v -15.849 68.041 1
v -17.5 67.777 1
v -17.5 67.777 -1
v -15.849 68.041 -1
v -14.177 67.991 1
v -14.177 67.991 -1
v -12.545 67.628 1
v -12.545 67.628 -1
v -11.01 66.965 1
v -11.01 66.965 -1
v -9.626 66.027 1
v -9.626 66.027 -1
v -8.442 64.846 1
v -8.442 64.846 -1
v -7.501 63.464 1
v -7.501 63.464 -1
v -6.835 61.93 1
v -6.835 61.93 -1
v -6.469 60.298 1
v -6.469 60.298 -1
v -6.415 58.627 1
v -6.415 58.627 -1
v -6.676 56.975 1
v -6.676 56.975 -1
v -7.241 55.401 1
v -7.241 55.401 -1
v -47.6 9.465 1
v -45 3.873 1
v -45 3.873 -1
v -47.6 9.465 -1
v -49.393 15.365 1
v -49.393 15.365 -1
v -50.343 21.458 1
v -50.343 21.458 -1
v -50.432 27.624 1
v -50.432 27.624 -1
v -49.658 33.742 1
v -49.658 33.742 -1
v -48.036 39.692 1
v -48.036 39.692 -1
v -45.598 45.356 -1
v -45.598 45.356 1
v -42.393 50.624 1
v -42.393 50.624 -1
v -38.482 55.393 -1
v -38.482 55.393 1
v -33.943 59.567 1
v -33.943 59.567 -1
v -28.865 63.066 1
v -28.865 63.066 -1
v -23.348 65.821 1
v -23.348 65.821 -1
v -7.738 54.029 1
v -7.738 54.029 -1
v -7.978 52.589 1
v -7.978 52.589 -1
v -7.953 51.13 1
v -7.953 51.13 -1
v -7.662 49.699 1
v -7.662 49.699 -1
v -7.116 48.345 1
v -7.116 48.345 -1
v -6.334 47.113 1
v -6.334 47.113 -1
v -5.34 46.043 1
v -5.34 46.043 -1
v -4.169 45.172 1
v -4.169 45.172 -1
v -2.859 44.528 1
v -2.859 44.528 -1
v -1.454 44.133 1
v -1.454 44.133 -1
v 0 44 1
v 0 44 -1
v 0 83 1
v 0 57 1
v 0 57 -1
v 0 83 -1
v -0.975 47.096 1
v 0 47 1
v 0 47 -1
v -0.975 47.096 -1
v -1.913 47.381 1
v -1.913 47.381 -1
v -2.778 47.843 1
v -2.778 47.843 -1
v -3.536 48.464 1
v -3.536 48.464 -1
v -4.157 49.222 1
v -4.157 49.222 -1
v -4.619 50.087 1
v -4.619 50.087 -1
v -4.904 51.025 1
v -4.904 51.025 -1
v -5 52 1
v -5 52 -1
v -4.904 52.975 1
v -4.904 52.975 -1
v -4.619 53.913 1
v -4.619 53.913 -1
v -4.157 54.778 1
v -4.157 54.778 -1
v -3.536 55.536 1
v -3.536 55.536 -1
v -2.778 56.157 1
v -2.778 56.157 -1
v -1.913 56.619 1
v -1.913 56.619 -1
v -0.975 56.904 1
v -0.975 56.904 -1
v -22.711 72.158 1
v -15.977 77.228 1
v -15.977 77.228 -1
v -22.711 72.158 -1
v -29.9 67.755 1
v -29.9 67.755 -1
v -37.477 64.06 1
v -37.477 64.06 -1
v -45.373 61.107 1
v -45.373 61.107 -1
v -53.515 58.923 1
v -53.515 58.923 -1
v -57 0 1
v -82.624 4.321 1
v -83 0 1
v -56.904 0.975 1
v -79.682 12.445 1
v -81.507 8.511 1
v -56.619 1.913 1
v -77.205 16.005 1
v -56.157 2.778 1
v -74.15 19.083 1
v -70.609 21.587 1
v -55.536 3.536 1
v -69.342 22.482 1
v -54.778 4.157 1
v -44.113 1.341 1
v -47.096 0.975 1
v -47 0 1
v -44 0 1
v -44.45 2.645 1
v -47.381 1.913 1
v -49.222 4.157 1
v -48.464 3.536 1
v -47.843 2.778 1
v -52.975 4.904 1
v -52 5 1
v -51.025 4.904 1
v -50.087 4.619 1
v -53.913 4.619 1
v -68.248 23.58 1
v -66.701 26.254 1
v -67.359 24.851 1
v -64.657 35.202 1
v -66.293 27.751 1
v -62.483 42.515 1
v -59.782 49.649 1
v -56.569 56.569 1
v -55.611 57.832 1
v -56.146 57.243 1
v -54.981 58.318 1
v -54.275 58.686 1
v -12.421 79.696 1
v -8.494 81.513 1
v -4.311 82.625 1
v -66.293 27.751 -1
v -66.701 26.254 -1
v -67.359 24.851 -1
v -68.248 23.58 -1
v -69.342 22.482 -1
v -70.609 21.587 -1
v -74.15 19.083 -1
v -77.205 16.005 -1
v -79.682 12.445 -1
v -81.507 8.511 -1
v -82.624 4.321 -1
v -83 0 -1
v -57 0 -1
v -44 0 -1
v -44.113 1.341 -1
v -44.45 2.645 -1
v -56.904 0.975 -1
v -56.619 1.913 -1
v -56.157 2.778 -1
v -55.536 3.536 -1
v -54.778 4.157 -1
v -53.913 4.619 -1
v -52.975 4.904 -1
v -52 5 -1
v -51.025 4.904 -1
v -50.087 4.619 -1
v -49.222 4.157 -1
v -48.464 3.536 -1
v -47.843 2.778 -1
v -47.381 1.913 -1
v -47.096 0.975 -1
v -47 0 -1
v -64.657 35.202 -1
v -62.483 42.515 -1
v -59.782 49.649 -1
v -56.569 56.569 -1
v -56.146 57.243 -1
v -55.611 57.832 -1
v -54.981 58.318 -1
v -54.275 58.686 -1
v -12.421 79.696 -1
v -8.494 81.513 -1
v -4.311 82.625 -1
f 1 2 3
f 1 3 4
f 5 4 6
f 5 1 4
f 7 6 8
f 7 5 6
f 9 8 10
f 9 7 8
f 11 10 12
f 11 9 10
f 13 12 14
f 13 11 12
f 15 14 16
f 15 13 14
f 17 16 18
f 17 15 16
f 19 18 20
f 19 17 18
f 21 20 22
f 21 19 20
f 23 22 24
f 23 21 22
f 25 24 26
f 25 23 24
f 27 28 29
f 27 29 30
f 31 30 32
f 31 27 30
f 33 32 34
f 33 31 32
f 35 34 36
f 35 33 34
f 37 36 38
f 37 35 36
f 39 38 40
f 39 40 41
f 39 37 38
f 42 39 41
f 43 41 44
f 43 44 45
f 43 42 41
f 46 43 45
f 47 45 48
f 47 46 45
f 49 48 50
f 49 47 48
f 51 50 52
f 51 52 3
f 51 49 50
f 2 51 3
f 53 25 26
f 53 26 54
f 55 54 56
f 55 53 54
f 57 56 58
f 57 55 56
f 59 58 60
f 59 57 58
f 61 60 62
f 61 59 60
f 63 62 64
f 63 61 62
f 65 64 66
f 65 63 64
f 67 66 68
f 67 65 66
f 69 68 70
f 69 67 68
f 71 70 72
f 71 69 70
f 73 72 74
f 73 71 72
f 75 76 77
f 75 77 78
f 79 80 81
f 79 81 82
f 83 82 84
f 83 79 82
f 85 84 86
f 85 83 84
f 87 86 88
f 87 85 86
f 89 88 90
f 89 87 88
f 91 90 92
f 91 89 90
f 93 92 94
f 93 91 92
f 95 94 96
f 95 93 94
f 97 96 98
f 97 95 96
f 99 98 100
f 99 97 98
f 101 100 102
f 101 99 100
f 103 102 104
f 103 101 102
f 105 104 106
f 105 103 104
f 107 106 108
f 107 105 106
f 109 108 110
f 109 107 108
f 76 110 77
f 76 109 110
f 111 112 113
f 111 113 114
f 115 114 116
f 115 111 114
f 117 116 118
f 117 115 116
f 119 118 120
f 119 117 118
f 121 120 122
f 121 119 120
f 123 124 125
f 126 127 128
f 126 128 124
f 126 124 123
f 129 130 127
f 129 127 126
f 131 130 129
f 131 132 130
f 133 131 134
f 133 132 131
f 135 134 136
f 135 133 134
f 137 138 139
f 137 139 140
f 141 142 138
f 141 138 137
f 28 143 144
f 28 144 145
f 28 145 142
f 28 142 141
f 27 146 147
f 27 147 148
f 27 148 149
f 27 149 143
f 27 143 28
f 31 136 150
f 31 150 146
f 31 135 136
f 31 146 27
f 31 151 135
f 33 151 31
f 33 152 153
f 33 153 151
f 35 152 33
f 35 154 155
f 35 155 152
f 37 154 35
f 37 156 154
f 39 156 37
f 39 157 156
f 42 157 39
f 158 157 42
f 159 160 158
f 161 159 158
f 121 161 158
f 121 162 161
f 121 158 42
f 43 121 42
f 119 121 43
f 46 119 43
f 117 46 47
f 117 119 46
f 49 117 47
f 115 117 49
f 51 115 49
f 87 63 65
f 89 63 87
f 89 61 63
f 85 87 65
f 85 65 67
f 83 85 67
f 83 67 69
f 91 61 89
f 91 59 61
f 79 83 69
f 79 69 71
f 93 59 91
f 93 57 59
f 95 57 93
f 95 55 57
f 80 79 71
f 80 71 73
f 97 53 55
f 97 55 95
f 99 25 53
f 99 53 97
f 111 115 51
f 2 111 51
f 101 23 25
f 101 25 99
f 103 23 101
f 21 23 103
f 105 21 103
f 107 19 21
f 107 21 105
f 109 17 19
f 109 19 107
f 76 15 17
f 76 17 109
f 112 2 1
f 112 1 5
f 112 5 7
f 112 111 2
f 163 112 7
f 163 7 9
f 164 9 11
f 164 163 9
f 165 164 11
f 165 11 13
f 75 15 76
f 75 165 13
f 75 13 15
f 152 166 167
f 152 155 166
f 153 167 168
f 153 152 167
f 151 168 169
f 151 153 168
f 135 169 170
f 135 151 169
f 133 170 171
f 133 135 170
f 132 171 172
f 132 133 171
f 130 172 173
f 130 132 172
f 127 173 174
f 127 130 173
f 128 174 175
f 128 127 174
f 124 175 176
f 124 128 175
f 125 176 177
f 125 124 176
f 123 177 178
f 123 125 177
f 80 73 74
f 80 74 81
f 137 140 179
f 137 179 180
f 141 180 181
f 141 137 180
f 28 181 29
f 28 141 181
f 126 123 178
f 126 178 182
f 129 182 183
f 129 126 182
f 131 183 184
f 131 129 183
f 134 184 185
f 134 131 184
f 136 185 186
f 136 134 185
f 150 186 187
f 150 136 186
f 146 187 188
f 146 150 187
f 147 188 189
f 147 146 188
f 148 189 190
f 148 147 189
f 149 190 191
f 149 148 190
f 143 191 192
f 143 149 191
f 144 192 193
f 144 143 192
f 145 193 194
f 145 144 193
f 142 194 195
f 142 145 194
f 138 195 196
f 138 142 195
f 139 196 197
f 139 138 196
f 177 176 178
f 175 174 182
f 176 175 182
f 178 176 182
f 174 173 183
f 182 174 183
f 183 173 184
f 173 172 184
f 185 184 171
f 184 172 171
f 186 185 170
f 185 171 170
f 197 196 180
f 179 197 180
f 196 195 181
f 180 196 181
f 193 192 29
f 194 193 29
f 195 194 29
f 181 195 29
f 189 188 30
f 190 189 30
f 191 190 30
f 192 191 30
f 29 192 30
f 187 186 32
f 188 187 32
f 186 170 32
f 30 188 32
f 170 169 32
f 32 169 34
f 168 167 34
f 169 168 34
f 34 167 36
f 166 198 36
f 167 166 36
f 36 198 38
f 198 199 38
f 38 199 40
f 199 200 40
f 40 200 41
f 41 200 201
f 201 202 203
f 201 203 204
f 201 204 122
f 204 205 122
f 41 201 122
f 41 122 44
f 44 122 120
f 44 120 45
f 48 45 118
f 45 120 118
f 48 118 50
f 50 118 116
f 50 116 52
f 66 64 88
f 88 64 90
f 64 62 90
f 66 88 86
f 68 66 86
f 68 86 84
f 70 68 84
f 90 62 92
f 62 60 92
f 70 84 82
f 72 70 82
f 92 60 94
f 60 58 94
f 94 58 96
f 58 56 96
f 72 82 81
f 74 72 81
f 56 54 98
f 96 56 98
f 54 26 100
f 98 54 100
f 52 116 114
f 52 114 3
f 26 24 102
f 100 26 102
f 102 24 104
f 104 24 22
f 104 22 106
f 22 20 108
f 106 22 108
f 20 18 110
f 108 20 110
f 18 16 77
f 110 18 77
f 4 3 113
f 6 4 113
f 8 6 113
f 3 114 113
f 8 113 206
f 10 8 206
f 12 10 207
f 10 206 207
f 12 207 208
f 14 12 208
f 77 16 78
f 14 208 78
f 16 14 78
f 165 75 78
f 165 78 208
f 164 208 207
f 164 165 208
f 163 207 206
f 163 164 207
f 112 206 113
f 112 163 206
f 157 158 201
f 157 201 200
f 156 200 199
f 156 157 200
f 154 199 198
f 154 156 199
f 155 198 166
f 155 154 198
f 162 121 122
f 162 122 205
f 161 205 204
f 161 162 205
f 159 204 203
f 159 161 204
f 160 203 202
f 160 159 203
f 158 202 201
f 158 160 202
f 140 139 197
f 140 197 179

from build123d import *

# Parameters (mm, degrees)
LINEAR_AUSTRAGEN1_DEPTH = 1


with BuildPart() as part:
    # Außenkontur → Linear austragen1 (new body, symmetric)
    with BuildSketch(Plane.XY):
        with BuildLine():
            Line((-83, 0), (-57, 0))
            ThreePointArc((-57, 0), (-52, 5), (-47, 0))
            Line((-47, 0), (-44, 0))
            ThreePointArc((-44, 0), (-44.254033308, 2), (-45, 3.872983346))
            ThreePointArc((-45, 3.872983346), (-46.916580756, 42.566918881), (-17.5, 67.777208559))
            ThreePointArc((-17.5, 67.777208559), (-8.441984355, 64.845892989), (-7.240867658, 55.401446097))
            ThreePointArc((-7.240867658, 55.401446097), (-6.75320549, 47.711152181), (0, 44))
            Line((0, 44), (0, 47))
            ThreePointArc((0, 47), (-5, 52), (0, 57))
            Line((0, 57), (0, 83))
            ThreePointArc((0, 83), (-8.493750568, 81.512894362), (-15.977012787, 77.228496103))
            ThreePointArc((-15.977012787, 77.228496103), (-33.644463337, 65.816474944), (-53.515303741, 58.922801215))
            ThreePointArc((-53.515303741, 58.922801215), (-55.306825995, 58.089224466), (-56.568542495, 56.568542495))
            ThreePointArc((-56.568542495, 56.568542495), (-62.483030705, 42.514608), (-66.293095094, 27.75054166))
            ThreePointArc((-66.293095094, 27.75054166), (-67.776085308, 24.196284331), (-70.608999234, 21.587337453))
            ThreePointArc((-70.608999234, 21.587337453), (-79.682077632, 12.445381054), (-83, 0))
        make_face()
    extrude(amount=LINEAR_AUSTRAGEN1_DEPTH, both=True)


solid = part.part
